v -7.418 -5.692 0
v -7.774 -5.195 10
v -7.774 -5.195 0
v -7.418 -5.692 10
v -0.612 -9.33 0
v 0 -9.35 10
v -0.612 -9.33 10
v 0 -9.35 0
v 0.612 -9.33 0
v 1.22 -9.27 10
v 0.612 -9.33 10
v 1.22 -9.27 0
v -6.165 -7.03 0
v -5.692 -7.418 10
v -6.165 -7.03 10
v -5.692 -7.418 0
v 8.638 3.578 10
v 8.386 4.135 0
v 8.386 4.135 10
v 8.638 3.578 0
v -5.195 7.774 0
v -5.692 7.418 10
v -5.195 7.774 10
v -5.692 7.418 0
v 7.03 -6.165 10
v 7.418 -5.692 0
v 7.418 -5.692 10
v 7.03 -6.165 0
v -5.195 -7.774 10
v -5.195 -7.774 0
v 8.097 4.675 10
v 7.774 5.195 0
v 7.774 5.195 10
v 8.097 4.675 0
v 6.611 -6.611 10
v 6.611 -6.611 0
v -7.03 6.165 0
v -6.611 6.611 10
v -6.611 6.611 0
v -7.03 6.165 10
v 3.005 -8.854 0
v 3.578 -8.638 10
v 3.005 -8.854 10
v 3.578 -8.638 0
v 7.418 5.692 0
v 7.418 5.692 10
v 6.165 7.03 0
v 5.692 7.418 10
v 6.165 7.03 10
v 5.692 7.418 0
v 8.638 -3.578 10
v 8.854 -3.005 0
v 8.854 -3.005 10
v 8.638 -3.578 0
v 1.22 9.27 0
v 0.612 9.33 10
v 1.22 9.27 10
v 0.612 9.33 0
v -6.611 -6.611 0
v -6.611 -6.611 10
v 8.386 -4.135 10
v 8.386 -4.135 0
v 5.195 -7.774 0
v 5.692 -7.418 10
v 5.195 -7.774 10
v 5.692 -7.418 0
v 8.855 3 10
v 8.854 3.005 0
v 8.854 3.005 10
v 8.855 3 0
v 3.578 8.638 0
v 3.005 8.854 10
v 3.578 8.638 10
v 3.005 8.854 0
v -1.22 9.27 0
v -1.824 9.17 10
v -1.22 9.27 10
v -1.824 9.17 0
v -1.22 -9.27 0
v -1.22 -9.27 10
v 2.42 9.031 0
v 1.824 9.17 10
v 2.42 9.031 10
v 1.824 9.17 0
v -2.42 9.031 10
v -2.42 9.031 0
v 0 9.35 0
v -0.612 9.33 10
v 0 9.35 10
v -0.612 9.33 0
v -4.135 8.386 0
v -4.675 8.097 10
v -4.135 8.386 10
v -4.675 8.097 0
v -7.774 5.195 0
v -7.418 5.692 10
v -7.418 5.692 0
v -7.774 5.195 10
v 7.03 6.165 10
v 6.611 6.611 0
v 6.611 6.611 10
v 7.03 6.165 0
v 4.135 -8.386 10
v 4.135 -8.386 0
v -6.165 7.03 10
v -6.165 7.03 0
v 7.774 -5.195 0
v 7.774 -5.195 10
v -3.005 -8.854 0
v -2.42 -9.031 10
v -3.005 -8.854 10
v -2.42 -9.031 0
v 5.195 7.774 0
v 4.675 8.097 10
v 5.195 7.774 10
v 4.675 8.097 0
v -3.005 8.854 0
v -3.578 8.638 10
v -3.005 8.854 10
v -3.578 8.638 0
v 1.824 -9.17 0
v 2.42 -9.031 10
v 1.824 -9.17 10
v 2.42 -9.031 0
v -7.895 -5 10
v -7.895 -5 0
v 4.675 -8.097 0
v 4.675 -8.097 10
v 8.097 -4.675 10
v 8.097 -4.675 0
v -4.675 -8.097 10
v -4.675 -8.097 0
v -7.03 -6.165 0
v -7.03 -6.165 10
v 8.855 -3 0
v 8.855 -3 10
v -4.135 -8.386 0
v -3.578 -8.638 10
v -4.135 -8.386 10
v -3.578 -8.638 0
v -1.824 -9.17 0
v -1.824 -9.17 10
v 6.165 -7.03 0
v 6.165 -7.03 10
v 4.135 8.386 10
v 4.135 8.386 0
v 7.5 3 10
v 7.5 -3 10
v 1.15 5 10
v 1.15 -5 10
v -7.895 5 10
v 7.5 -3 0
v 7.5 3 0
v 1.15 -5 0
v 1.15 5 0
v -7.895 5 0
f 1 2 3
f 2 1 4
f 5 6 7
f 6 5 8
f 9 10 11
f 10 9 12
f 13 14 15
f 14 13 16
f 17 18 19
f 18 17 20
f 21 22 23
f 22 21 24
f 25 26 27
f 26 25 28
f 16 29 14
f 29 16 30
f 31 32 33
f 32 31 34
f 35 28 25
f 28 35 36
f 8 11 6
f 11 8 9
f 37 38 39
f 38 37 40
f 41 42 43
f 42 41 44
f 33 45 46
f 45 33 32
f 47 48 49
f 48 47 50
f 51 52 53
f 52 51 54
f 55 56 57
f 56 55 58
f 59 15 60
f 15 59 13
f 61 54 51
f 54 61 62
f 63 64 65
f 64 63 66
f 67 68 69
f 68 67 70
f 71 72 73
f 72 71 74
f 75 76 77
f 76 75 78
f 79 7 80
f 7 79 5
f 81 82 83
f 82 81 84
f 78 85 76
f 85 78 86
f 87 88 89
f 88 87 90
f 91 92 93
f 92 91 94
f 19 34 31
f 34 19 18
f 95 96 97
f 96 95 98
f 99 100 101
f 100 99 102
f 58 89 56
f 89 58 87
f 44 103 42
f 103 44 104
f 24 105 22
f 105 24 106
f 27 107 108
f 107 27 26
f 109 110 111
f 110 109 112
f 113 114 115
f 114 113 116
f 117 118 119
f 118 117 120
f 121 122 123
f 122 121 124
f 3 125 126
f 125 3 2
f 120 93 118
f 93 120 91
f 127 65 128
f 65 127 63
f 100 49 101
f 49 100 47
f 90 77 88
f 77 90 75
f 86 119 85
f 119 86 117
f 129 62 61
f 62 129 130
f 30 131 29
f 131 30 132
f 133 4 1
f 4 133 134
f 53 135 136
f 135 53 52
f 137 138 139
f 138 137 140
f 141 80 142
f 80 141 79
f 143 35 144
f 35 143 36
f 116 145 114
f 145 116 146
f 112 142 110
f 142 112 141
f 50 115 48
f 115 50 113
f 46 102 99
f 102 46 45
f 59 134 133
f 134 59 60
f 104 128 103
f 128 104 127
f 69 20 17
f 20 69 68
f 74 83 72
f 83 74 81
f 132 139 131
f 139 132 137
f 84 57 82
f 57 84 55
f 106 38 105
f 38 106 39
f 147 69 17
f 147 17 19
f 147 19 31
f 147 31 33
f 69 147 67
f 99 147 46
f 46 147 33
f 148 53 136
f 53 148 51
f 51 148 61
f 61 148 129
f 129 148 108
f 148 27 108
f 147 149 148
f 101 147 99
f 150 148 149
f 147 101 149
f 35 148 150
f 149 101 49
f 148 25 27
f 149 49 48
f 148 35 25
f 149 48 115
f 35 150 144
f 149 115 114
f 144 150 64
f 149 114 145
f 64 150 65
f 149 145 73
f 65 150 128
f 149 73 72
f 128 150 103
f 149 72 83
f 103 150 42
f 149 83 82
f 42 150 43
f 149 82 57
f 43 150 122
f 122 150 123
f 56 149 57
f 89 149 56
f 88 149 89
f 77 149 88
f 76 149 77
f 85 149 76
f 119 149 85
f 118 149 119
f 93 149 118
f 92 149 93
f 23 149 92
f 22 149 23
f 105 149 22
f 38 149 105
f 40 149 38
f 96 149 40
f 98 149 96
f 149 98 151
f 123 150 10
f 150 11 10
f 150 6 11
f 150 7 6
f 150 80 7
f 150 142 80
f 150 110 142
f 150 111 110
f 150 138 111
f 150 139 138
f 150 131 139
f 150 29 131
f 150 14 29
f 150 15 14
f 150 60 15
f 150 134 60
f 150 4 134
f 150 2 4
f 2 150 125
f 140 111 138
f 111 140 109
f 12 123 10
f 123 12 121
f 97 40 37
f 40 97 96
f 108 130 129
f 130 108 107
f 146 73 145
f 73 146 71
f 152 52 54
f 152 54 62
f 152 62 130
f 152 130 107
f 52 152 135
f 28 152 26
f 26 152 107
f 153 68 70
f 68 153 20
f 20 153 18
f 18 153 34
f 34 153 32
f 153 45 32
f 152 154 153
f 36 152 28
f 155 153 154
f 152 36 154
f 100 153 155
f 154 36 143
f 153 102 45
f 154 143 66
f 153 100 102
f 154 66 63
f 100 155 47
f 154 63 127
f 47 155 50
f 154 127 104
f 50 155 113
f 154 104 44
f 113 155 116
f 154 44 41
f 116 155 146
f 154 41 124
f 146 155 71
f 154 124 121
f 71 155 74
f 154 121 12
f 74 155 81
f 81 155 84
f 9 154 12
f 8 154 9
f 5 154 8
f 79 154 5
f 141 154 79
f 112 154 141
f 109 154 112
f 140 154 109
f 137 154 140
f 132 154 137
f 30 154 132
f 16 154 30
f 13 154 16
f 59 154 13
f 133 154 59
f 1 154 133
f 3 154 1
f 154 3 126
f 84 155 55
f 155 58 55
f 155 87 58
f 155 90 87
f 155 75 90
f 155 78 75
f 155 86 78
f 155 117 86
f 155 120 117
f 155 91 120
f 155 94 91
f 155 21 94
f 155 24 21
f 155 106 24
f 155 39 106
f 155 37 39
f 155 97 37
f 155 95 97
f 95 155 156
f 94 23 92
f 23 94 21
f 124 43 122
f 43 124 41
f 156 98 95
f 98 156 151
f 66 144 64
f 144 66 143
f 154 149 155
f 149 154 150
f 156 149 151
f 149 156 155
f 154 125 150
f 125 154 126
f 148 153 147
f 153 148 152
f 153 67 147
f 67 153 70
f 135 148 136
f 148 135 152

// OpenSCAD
// Stand rod and tubing clip - printed flat, 10 mm tall extrusion
// Units: mm. $fn = 96 for ring resolution.

// ---------------- Parameters ----------------
clip_height      = 10;    // extrusion height (Z)
stand_d          = 12.7;  // stand rod diameter (ring inner diameter)
stand_wall       = 3;     // stand ring wall thickness
stand_outer      = stand_d + 2 * stand_wall; // 18.7 mm
stand_cut_width  = 10;    // opening cut out of -X side of stand ring

tubing_d         = 6;     // tubing inner diameter
tubing_wall      = 2;     // tubing ring wall thickness
tubing_outer     = tubing_d + 2 * tubing_wall; // 10 mm
tubing_x         = 15;    // tubing ring centre X
tubing_cut_width = 4.5;   // opening cut out of +X side of tubing ring

bridge_x1        = 8;     // bridge start X
bridge_x2        = 12;    // bridge end X
bridge_w         = 6;     // bridge width (Y)

eps              = 0.5;   // cutter overshoot past faces
// ---------------- Model ----------------
difference() {
    // Stand ring, centred at origin, opening on -X side
    ring(stand_outer, stand_d, clip_height, stand_cut_width, eps);

    // Tubing ring, centred at x = 15, opening on +X side
    translate([tubing_x, 0, 0])
        ring(tubing_outer, tubing_d, clip_height, tubing_cut_width, eps);

    // Solid bridge between x = 8 and x = 12, width 6 (Y)
    translate([bridge_x1 - eps, -bridge_w / 2, 0])
        cube([bridge_x2 - bridge_x1 + 2 * eps, bridge_w, clip_height]);
}

// ---------------- Helpers ----------------
module ring(outer, inner, h, cut_w, overshoot) {
    // Ring with a rectangular opening cut out of the -X side
    difference() {
        cylinder(h = h, d = outer, $fn = 96);
        translate([-outer / 2 - overshoot, -cut_w / 2, 0])
            cube([cut_w + 2 * overshoot, cut_w, h]);
    }
}
